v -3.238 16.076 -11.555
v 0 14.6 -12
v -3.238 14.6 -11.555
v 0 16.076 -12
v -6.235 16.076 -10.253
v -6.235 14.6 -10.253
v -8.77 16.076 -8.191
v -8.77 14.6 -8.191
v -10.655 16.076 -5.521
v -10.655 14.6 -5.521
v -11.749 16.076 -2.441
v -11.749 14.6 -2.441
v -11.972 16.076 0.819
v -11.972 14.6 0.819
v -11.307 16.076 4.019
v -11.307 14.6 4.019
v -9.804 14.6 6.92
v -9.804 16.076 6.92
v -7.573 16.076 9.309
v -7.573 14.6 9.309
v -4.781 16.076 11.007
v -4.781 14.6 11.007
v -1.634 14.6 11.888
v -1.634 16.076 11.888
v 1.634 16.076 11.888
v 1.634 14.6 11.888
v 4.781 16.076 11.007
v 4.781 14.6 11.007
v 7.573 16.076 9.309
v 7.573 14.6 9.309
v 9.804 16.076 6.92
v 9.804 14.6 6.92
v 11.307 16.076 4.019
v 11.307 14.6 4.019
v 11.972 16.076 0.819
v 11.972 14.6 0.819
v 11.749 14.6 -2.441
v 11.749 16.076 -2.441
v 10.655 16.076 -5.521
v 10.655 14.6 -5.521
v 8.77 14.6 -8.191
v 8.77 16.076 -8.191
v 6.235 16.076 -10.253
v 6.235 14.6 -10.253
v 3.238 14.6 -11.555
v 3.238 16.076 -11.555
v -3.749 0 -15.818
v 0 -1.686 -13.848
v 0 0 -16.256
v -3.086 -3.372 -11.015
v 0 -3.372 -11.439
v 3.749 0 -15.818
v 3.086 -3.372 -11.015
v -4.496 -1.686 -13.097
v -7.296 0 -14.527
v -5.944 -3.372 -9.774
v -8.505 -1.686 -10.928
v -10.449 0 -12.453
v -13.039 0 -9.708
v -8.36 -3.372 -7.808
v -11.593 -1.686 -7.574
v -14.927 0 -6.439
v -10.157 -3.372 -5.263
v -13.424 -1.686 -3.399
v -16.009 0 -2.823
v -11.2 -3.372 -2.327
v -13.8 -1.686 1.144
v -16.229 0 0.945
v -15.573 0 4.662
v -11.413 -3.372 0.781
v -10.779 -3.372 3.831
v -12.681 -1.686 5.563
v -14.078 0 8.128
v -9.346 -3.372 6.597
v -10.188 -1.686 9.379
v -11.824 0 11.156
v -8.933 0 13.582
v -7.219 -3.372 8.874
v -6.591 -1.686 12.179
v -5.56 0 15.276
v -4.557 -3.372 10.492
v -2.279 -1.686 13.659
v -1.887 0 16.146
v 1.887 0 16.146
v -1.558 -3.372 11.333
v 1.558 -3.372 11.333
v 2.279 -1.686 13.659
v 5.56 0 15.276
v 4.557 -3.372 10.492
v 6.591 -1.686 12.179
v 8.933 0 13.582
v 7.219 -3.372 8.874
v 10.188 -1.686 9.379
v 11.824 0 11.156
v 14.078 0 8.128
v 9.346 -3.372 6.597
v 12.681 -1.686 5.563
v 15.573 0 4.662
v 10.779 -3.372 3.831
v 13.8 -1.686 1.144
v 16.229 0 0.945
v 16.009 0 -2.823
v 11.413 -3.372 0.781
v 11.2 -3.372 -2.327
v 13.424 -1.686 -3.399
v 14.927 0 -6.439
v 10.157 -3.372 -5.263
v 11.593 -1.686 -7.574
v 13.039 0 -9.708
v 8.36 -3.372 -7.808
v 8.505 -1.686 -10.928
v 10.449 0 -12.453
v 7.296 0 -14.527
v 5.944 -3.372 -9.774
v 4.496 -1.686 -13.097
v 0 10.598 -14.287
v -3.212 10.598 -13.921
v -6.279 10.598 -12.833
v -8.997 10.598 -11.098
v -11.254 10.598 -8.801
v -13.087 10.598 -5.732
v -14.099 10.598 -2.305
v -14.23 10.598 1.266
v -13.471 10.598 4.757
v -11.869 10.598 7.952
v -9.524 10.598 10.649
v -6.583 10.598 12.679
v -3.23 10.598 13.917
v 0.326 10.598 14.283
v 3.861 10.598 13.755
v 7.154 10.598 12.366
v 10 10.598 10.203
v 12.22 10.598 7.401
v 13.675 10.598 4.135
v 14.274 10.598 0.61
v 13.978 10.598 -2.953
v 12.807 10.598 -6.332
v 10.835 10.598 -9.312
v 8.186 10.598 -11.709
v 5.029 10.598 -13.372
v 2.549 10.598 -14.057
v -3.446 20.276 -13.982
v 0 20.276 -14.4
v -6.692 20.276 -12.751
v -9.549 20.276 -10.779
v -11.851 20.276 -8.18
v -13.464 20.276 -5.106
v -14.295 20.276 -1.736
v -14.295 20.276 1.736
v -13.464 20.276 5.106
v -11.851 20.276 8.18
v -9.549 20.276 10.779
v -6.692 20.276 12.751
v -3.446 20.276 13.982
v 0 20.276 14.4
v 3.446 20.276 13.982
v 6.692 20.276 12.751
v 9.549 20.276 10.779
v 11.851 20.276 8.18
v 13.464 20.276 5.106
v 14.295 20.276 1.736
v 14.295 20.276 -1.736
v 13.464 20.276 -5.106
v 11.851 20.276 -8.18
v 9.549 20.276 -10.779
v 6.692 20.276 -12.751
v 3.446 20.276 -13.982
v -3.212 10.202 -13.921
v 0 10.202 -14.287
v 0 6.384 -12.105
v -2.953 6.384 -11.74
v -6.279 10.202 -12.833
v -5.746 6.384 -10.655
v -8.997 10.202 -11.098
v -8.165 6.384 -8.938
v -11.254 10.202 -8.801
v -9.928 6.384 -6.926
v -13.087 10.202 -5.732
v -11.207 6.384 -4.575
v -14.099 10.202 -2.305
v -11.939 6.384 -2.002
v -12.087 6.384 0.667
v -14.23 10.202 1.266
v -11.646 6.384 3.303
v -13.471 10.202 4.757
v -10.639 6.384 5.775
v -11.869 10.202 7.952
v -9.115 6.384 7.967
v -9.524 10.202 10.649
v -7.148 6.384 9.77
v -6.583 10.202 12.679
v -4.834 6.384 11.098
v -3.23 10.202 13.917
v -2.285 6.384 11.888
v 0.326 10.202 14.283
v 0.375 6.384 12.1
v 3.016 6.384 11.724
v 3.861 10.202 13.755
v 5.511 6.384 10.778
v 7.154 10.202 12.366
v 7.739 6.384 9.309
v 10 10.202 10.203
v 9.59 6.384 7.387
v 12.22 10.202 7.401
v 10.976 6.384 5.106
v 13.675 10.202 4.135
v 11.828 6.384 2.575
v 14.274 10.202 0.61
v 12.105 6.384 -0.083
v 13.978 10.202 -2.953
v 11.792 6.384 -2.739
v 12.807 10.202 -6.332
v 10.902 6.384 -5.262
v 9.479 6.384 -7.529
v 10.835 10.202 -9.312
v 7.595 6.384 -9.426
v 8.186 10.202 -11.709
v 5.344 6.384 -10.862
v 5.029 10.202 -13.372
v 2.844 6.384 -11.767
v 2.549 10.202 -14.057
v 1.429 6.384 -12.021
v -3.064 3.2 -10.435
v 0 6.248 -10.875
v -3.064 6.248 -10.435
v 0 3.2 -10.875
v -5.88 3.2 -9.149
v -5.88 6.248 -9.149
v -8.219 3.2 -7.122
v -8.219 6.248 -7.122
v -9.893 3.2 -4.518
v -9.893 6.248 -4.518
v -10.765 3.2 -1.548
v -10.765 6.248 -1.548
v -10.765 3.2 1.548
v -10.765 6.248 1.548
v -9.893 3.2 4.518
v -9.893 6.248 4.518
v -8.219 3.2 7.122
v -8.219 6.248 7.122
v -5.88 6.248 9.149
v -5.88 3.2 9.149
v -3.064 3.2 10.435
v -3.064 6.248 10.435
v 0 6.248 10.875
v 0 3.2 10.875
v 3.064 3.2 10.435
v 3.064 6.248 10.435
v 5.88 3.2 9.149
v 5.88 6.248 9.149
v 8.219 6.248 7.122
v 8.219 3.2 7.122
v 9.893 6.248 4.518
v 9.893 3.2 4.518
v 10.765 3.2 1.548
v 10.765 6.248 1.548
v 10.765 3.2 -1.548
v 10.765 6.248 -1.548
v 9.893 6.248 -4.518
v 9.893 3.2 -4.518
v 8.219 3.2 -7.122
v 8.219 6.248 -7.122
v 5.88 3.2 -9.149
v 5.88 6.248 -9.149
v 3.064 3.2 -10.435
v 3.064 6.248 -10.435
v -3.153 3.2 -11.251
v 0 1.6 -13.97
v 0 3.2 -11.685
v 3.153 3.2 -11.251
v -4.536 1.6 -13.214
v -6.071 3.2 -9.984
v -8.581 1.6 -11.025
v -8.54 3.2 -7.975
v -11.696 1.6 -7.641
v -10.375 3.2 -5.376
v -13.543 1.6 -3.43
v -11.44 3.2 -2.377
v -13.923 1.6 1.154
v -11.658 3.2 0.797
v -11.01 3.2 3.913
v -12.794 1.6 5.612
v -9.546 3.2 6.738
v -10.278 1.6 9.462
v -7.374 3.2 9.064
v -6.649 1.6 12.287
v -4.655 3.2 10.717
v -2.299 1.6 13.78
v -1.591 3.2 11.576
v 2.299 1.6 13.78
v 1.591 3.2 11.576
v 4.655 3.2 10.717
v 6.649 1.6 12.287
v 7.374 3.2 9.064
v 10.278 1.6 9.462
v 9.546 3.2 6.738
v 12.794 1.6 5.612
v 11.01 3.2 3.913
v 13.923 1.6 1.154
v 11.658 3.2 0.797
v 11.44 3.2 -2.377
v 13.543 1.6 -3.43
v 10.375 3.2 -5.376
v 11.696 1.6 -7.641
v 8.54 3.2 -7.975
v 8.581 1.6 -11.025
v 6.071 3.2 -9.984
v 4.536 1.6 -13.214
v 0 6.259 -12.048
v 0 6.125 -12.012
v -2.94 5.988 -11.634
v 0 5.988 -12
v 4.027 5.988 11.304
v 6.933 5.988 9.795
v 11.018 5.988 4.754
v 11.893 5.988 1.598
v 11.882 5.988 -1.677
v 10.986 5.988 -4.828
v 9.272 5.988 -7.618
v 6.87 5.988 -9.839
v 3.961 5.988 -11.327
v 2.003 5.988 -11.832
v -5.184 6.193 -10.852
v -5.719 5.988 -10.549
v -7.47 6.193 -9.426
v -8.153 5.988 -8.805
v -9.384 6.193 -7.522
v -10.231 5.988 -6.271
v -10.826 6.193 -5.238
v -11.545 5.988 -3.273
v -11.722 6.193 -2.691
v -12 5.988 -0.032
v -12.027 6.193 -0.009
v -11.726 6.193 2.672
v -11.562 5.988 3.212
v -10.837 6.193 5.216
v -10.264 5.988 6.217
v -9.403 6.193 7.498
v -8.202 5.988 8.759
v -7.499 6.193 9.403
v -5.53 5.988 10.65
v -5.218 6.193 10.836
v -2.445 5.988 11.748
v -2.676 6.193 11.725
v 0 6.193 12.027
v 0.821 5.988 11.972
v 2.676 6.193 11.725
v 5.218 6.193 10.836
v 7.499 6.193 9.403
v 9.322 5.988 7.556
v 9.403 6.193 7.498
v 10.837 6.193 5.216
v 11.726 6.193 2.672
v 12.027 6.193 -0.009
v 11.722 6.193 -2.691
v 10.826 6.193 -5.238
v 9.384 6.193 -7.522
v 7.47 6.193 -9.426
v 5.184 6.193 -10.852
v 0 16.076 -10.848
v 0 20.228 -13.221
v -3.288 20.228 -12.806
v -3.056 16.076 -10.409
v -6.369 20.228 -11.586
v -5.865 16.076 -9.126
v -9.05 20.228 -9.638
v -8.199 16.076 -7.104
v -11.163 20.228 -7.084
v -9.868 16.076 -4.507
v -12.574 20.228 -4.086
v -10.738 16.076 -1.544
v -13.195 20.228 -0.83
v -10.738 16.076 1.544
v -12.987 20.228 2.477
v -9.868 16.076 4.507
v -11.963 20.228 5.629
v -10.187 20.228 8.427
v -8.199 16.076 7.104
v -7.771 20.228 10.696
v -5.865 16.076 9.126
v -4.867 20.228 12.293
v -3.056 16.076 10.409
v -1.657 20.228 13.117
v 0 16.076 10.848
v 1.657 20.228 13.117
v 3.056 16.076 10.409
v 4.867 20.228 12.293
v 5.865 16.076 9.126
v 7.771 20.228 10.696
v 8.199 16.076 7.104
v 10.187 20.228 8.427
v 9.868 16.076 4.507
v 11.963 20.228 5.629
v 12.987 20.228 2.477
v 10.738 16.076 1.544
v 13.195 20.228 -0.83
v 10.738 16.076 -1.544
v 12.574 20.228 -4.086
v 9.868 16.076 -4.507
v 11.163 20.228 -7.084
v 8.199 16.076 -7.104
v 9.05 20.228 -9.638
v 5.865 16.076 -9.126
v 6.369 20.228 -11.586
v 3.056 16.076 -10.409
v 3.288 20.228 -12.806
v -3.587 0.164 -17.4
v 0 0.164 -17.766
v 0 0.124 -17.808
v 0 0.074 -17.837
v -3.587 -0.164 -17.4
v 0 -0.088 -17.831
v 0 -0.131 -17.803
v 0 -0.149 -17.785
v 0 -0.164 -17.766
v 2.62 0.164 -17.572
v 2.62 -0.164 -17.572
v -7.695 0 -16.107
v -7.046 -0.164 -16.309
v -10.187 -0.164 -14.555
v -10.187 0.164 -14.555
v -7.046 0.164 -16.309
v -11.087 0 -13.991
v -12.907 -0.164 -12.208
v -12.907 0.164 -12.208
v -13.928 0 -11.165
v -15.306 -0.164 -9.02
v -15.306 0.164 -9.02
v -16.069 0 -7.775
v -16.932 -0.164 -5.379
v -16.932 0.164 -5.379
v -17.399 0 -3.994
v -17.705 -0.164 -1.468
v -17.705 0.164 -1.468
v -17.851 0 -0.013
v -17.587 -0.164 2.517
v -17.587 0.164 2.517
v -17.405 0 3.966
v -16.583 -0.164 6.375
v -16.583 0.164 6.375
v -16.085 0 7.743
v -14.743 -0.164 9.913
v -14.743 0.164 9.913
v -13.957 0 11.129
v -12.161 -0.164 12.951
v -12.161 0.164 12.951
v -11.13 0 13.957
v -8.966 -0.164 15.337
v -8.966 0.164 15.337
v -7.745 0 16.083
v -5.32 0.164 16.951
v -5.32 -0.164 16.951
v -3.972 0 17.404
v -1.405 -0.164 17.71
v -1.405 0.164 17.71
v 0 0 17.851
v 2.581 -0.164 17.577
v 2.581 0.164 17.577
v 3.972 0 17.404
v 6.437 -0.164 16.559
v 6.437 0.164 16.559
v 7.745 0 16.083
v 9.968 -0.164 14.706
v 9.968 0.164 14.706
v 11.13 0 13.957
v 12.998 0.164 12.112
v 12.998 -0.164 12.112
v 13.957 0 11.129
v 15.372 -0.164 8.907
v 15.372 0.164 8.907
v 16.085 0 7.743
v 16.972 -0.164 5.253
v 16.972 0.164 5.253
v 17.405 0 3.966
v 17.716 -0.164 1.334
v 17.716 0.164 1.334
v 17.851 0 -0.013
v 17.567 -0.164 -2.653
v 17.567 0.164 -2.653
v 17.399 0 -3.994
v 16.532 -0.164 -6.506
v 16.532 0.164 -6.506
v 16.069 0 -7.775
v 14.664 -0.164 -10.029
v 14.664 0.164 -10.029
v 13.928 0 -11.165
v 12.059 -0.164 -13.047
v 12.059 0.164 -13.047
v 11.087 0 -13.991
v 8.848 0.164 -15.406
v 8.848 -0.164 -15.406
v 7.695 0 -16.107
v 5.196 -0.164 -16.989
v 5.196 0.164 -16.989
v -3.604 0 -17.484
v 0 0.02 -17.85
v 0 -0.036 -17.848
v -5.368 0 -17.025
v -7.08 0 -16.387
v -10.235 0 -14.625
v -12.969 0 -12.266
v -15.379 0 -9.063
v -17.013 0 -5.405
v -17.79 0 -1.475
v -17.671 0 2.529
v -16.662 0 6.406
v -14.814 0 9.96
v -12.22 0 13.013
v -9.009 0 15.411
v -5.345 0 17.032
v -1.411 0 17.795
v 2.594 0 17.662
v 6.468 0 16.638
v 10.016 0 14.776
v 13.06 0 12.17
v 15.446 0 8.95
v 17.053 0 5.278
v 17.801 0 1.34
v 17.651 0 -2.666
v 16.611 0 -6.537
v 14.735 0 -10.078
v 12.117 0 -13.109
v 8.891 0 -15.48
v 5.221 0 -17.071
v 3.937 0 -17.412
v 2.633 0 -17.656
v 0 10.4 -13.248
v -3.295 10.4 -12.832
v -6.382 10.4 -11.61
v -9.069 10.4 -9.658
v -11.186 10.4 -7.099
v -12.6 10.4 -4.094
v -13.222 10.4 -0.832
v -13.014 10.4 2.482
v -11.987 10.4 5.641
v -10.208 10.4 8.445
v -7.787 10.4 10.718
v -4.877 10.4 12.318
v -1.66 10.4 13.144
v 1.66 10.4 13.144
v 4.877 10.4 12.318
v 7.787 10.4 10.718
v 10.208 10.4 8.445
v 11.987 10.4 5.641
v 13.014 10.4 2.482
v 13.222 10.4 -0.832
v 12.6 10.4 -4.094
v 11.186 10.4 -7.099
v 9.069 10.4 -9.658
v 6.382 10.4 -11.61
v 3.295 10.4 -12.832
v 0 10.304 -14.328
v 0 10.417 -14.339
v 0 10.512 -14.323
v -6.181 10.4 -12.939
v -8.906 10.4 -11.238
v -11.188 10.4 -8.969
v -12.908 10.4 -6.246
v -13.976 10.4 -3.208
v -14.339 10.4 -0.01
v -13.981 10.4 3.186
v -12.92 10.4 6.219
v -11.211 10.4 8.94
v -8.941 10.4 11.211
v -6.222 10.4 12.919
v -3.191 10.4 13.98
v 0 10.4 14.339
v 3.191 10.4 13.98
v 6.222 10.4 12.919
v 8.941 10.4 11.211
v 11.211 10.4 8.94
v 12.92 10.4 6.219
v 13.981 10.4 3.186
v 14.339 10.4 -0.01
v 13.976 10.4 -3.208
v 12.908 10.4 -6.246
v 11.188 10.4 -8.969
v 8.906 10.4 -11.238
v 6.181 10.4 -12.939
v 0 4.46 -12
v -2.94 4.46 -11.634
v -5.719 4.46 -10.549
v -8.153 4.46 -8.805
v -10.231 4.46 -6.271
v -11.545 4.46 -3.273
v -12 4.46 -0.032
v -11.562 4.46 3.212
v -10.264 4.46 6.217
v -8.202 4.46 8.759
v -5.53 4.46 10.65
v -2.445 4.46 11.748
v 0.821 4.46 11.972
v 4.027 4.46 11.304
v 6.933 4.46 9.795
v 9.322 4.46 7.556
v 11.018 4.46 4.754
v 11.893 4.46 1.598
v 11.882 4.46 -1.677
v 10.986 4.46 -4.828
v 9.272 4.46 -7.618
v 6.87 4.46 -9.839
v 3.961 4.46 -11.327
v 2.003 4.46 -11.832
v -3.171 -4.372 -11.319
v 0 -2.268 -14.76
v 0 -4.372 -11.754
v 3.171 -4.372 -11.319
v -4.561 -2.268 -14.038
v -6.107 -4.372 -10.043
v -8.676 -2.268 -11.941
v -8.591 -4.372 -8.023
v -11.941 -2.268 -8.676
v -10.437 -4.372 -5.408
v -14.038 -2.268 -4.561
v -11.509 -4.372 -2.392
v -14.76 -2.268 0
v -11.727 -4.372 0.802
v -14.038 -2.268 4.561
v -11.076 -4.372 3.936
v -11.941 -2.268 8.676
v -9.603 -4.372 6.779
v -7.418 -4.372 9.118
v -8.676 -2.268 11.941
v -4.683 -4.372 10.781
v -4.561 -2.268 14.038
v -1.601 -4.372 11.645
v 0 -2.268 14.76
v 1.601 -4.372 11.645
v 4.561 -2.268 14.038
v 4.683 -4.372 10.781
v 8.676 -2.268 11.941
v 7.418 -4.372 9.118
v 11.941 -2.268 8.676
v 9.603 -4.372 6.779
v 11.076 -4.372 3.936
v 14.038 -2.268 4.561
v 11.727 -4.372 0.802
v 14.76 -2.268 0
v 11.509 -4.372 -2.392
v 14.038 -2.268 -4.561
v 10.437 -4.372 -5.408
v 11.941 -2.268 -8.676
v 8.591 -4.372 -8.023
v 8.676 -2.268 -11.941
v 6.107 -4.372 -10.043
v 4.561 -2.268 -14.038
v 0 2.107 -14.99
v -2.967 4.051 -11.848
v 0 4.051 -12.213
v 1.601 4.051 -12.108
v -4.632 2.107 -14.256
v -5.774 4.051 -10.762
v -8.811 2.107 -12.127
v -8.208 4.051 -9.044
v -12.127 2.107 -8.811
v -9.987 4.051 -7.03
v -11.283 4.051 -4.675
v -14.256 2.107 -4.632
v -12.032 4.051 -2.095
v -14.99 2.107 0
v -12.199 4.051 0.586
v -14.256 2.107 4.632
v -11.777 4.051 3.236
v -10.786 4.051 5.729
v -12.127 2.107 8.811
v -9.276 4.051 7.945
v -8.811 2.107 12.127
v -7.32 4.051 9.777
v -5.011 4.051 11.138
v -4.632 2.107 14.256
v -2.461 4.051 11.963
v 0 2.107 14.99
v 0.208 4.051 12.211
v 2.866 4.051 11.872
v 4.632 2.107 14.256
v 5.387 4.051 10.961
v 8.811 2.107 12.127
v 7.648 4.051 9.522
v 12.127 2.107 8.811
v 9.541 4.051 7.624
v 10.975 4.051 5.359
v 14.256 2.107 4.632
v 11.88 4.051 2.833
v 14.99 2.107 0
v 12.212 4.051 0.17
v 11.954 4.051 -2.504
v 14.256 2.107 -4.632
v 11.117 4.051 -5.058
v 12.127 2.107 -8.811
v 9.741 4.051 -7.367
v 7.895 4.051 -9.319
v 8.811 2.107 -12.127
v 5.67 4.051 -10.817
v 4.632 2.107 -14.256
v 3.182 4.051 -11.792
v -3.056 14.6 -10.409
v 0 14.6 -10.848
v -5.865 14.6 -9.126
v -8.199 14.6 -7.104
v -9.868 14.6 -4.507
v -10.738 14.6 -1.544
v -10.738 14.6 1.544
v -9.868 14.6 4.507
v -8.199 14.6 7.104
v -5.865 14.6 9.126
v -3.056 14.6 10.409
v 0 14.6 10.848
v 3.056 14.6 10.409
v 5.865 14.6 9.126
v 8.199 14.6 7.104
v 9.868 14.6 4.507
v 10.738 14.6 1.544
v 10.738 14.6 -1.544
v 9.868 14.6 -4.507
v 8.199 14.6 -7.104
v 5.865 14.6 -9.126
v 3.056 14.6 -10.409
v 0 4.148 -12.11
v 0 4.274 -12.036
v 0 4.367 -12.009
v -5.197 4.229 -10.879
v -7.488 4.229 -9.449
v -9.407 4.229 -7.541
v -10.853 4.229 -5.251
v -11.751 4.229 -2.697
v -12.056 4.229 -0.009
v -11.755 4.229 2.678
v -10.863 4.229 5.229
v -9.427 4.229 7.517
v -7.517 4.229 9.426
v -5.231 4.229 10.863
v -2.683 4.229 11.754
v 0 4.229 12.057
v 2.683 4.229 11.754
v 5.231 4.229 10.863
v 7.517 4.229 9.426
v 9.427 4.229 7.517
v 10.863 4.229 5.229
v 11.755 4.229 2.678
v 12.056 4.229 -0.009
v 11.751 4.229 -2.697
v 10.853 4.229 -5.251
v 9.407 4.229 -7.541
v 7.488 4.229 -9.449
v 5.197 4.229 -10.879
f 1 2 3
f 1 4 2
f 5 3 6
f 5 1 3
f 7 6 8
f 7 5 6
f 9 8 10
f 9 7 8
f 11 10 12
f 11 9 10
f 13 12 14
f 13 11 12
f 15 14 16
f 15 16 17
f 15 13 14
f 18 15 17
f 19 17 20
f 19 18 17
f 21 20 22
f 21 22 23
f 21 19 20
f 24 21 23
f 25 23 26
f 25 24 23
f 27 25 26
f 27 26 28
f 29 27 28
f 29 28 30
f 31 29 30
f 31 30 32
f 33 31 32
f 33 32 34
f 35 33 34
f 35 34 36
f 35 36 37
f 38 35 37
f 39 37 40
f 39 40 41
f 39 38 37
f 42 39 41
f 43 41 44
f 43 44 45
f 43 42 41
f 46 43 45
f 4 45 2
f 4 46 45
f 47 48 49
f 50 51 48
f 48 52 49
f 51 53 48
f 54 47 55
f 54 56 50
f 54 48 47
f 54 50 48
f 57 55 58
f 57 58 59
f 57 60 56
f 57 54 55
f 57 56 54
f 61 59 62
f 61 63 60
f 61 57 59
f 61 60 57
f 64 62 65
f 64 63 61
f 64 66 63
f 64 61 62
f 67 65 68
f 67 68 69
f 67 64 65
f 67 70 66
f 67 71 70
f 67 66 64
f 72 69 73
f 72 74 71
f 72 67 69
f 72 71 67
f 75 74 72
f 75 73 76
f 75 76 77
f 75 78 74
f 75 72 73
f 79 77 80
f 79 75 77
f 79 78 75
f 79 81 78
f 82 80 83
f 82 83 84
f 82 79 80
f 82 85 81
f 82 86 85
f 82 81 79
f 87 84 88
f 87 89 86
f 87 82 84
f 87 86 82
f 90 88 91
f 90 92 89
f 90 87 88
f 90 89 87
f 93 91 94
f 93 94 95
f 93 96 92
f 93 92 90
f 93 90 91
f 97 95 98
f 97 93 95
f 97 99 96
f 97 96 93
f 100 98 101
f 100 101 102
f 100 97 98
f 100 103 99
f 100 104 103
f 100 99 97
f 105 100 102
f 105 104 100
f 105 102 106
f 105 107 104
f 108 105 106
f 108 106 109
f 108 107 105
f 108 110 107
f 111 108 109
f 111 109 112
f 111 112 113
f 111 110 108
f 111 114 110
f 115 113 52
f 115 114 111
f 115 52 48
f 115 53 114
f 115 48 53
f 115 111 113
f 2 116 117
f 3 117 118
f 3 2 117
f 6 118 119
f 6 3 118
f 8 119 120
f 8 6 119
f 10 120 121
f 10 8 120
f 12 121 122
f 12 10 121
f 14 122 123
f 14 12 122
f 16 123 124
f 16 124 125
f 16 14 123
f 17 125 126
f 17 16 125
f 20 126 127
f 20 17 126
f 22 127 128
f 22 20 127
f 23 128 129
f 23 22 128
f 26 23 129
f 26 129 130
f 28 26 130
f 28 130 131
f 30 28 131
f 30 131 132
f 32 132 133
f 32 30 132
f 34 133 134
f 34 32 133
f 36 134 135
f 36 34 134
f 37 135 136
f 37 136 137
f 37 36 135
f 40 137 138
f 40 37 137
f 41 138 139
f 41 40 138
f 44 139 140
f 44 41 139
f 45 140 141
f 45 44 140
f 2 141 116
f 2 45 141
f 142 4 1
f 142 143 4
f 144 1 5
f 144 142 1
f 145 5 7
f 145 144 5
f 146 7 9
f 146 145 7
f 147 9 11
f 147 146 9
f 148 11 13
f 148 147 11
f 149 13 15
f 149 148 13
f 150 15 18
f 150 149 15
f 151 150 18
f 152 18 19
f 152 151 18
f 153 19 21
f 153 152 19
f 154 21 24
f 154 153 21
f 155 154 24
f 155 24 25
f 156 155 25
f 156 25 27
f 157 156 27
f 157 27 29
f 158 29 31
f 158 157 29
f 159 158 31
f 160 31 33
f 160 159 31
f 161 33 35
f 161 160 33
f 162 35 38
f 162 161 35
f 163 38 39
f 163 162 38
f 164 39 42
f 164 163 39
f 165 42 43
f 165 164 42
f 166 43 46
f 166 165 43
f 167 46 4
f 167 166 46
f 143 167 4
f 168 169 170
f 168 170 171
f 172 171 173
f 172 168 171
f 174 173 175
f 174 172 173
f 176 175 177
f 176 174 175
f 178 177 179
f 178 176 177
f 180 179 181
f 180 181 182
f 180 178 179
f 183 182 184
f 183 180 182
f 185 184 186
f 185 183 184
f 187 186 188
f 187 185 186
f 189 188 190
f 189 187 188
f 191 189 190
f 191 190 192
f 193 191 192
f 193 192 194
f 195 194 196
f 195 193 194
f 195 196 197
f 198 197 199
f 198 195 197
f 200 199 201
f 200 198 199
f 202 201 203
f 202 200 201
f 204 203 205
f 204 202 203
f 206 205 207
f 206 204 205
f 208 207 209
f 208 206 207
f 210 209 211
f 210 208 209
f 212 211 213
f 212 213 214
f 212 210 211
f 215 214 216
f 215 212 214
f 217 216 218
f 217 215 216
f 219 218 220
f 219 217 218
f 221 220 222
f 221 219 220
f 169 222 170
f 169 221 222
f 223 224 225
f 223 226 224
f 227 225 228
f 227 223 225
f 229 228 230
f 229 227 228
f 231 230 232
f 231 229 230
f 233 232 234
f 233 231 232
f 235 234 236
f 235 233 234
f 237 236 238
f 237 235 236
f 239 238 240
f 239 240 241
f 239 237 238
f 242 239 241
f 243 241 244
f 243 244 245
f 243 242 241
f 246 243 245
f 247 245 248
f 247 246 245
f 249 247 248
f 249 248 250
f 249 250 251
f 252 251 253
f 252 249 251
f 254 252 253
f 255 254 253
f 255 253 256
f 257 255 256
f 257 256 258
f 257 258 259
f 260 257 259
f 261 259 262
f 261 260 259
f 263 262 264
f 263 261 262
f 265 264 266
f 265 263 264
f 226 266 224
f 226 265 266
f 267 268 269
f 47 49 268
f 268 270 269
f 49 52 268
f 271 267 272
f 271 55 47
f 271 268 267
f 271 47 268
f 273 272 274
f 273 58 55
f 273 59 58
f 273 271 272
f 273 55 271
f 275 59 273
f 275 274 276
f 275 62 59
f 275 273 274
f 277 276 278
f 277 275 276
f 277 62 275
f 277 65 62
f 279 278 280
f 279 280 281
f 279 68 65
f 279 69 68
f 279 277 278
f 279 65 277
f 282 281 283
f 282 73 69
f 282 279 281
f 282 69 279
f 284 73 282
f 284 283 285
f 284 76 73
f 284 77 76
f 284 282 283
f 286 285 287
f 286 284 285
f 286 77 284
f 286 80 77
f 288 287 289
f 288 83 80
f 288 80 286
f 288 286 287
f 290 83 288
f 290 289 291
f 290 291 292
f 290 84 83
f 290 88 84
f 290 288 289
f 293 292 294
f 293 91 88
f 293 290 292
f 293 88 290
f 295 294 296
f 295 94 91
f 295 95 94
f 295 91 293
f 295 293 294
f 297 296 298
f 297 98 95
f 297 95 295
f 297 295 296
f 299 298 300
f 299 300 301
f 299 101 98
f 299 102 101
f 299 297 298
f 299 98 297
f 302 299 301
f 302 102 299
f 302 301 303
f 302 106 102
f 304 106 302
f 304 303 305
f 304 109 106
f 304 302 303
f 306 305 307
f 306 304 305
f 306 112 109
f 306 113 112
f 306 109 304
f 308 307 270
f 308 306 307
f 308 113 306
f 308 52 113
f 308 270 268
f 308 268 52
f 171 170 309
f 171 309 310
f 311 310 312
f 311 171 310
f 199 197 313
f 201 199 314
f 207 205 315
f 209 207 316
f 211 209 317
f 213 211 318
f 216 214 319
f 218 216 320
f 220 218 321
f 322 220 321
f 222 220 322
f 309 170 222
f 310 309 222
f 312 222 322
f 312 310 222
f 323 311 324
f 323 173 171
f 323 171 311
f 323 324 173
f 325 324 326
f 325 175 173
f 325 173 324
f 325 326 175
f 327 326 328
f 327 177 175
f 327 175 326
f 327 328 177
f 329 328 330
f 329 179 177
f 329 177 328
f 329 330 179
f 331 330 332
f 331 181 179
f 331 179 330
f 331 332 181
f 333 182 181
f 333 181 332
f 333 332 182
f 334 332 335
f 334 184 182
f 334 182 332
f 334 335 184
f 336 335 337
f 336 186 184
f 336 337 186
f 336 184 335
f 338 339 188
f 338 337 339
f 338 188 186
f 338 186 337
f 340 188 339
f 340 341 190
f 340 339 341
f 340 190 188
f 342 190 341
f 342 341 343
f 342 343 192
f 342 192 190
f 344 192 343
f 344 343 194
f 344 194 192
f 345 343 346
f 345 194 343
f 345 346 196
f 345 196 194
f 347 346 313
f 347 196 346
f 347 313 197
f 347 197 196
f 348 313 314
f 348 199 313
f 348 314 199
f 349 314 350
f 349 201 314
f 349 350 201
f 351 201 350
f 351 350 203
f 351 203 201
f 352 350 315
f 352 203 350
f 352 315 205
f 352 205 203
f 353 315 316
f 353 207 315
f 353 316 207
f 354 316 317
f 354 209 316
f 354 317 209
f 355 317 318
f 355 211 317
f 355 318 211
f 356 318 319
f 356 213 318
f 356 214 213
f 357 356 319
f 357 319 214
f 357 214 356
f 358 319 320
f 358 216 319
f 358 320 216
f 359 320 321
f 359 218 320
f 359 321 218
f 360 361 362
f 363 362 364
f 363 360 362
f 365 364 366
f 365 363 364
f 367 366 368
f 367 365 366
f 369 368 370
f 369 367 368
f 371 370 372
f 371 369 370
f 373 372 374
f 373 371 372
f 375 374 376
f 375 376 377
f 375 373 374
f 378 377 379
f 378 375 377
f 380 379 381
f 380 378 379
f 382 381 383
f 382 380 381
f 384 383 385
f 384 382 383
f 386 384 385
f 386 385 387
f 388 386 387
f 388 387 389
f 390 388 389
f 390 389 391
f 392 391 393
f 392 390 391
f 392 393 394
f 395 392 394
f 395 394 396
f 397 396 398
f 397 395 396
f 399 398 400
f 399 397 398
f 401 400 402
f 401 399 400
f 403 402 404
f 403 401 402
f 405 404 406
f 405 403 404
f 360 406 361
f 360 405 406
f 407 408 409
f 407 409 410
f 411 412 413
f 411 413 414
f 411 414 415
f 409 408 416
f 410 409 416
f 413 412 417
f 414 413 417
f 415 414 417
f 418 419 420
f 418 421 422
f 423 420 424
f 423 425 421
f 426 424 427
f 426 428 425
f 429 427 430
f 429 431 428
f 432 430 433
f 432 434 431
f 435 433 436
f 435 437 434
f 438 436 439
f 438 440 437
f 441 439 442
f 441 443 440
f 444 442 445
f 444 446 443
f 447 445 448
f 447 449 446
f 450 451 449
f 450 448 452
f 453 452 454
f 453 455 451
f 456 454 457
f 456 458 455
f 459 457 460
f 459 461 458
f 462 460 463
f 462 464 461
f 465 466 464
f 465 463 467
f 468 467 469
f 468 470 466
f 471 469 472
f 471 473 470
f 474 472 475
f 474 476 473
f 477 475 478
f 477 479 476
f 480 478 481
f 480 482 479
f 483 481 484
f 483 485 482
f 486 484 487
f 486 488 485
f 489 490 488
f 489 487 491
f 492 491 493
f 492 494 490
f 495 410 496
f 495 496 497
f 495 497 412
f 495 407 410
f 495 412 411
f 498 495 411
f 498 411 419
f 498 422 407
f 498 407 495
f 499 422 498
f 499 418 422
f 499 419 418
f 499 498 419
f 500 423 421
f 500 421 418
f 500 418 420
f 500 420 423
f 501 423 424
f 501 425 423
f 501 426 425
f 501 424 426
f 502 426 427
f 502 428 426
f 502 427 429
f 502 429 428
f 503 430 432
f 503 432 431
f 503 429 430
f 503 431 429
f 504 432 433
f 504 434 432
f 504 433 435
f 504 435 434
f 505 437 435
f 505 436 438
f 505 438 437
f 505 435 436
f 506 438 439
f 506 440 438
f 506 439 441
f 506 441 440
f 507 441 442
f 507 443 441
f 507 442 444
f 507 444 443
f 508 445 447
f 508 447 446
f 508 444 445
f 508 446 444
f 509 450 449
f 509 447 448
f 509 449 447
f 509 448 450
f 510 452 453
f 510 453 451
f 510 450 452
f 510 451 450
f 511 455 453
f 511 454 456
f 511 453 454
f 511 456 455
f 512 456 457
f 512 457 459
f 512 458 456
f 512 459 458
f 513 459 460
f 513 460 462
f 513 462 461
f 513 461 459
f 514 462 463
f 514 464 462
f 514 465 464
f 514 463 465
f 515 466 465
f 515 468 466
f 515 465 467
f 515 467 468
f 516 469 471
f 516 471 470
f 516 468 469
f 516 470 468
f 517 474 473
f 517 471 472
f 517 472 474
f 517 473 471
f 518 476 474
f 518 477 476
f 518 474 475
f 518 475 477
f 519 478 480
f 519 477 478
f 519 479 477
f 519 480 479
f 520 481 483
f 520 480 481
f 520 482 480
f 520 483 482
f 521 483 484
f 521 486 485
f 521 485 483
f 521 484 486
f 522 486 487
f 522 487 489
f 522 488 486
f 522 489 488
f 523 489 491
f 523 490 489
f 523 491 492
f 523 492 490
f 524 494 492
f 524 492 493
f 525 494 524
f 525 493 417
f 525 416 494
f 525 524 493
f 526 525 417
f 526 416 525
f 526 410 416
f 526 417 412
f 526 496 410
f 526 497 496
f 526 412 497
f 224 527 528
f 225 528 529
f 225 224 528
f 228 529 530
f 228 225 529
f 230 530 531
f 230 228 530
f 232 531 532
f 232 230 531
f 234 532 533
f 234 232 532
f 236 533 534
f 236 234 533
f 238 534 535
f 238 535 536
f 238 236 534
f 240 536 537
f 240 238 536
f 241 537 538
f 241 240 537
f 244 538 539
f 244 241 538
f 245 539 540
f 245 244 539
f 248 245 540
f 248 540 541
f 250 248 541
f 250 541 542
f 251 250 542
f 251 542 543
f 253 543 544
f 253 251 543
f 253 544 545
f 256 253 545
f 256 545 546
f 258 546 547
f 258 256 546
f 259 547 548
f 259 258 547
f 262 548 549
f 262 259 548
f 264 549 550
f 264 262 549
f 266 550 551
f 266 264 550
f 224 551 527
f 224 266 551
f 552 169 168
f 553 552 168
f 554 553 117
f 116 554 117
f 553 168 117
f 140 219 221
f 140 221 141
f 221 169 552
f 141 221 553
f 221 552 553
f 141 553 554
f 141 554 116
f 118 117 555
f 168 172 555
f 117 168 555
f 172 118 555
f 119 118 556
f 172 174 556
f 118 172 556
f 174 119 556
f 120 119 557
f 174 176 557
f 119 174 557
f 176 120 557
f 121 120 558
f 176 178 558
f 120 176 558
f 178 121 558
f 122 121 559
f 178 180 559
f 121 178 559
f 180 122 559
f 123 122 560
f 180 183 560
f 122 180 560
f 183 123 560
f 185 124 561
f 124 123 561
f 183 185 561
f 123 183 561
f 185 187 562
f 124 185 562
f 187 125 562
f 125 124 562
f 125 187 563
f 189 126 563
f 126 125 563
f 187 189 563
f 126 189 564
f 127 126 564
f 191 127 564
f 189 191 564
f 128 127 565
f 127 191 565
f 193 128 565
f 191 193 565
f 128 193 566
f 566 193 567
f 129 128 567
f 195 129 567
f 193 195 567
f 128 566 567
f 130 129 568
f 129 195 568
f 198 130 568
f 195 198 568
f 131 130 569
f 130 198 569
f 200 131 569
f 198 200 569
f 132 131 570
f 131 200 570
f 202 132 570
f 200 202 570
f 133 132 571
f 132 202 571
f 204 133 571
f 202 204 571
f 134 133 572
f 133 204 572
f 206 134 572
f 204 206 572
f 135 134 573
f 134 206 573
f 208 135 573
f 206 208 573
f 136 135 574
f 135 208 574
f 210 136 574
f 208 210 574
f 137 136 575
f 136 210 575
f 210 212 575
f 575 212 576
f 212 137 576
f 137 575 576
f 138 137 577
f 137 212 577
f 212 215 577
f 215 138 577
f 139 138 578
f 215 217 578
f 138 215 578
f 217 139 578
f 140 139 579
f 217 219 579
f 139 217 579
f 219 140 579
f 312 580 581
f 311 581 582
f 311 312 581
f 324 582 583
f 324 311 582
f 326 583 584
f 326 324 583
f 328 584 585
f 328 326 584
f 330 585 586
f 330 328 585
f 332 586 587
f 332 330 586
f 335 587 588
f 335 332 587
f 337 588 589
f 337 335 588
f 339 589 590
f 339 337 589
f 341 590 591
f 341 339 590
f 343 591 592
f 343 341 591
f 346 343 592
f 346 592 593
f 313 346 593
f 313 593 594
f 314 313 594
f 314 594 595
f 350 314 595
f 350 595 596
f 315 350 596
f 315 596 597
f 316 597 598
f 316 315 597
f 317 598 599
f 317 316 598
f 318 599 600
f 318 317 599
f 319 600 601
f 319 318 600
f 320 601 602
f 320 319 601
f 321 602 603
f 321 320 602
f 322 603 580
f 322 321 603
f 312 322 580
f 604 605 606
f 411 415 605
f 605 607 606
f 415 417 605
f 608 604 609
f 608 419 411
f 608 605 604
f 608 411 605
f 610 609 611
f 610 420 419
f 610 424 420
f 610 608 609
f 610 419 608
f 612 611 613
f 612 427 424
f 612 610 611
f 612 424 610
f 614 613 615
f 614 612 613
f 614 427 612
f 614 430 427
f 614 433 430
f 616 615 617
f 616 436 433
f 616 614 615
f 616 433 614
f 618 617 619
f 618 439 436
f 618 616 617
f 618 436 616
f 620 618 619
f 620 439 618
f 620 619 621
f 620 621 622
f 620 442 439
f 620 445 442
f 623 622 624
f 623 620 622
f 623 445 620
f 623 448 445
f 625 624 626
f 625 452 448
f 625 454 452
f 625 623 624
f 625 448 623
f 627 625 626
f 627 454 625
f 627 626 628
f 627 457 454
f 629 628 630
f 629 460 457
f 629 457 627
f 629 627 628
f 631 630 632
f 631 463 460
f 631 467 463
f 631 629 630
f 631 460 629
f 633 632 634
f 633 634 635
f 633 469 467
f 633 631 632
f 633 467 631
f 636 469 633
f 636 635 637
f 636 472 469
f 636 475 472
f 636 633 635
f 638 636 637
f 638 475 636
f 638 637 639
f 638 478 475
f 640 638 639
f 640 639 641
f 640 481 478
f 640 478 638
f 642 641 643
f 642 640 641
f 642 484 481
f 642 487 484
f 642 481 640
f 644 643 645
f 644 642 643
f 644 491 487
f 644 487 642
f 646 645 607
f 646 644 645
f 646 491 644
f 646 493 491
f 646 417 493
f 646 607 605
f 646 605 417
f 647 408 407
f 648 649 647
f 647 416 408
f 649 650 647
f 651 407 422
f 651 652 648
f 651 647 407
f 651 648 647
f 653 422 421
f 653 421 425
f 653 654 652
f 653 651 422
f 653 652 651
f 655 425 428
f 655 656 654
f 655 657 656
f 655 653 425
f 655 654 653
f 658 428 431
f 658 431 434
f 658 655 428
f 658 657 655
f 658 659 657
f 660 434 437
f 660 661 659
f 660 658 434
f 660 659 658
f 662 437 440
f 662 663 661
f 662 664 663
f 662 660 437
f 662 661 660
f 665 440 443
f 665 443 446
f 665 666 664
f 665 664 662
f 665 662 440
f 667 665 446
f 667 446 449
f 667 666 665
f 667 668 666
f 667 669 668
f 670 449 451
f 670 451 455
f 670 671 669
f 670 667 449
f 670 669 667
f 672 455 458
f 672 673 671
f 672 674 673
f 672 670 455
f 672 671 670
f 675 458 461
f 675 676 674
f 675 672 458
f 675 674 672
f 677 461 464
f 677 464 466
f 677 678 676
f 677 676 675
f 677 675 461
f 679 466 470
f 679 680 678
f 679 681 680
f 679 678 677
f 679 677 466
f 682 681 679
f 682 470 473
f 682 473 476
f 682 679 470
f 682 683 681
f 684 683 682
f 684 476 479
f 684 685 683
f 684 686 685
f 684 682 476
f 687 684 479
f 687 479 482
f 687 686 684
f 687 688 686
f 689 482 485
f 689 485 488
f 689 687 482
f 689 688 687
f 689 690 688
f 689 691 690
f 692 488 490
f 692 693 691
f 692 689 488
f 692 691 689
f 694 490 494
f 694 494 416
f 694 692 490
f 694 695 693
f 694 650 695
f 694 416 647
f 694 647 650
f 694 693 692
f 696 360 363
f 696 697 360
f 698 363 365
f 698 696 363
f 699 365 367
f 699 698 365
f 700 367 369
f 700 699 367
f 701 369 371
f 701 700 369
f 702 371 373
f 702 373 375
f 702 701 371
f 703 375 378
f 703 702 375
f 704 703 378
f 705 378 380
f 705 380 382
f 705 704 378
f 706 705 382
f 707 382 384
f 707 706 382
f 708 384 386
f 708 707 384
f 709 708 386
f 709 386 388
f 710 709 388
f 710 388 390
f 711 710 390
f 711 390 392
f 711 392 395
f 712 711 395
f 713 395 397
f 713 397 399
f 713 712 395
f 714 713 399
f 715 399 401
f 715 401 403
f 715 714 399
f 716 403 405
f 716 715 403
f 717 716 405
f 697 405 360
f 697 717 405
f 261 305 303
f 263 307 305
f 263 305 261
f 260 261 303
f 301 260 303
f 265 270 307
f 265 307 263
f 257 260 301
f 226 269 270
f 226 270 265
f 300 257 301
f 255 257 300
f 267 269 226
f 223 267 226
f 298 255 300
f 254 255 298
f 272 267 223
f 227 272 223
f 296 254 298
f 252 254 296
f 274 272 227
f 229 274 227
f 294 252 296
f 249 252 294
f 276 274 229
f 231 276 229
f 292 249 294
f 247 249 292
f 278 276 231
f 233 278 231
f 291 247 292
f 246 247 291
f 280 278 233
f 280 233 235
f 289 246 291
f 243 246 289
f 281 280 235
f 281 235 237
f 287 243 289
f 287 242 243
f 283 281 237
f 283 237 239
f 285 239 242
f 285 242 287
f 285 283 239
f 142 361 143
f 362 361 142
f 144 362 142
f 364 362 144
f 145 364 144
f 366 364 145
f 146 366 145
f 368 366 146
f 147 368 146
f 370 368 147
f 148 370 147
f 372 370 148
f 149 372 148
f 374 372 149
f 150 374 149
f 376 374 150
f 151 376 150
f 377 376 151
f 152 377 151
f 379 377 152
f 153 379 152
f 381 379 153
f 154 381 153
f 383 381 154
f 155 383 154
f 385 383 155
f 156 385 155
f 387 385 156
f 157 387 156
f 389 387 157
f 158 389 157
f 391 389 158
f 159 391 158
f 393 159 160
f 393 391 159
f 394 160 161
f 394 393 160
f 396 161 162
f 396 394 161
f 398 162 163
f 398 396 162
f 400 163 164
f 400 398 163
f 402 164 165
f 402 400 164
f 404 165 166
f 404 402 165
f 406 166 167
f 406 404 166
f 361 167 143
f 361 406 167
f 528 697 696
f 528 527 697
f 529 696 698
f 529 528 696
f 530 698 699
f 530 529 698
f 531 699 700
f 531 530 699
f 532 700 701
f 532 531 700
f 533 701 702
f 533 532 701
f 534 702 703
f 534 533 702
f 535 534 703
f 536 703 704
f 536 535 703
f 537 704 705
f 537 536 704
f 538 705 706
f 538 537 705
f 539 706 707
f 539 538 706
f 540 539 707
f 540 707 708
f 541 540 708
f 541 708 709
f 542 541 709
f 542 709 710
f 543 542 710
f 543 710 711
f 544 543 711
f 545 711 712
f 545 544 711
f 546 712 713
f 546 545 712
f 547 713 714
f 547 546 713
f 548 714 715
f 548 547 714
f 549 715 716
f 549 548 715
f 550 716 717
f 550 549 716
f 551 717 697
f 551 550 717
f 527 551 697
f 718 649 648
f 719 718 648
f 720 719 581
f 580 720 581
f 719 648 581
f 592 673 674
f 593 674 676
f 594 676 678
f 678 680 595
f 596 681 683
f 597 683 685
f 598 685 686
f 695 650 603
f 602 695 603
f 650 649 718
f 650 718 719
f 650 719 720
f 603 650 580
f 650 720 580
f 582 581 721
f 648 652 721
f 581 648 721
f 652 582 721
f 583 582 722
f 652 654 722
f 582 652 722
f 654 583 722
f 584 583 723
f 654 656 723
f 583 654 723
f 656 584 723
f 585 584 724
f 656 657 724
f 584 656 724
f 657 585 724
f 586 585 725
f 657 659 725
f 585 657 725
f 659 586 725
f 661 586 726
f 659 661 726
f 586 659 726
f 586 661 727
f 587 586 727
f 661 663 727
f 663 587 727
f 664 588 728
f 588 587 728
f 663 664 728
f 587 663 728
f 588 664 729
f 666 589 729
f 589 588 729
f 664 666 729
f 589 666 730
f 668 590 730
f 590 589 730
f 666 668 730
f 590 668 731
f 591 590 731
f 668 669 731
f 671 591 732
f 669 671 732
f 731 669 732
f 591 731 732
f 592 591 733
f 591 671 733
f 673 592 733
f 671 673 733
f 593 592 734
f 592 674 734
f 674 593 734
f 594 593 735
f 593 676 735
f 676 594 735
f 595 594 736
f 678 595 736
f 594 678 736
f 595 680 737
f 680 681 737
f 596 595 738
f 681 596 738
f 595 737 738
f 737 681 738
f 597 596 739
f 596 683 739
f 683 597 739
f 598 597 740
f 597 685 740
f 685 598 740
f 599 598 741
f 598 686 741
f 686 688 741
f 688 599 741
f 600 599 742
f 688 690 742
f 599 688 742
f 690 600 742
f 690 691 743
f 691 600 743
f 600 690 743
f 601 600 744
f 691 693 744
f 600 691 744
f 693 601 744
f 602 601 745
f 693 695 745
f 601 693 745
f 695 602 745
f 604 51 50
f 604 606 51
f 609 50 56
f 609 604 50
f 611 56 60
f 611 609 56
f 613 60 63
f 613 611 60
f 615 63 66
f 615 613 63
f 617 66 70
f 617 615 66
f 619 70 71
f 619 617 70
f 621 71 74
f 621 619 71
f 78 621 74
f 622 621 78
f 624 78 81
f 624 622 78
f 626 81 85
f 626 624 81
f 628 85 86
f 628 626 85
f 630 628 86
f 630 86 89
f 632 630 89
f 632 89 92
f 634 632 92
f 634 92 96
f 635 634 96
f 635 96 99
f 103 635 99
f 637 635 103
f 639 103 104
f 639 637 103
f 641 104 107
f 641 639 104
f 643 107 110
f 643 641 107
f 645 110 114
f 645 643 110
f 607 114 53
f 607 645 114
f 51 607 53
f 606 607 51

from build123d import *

# Parameters (mm, degrees)
FILLET_OUT_LOW_R    = 0.2
FILLET_ACTIVE_LOW_R = 0.5
FILLET5_R           = 0.4
FILLET6_R           = 0.8


with BuildPart() as part:
    # Sketch1 → Revolve1 (revolve)
    with BuildSketch(Plane.XY, mode=Mode.PRIVATE) as revolve1_sk:
        Polygon((-18, 0), (-12, 4.2), (-12, 6.2), (-14.4, 10.4), (-12, 14.6), (-12, 16.07594668), (-14.4, 20.27594668), (-13.221046964, 20.228343303), (-10.848248893, 16.07594668), (-10.848248893, 14.6), (-13.248248893, 10.4), (-10.875450822, 6.247603376), (-10.875450822, 3.2), (-11.684777769, 3.2), (-16.256206341, 0), (-11.439277272, -3.371850348), (-11.754499503, -4.371850348), align=None)
    revolve(revolve1_sk.sketch.rotate(Axis((0, -8.65, 0), (0, 1, 0)), 270), axis=Axis((0, -8.65, 0), (0, 1, 0)))

    # fillet_out_low
    fillet_out_low_edges = [part.edges().sort_by_distance(p)[0] for p in [
        (0, 0, 18),
    ]]
    fillet(fillet_out_low_edges, radius=FILLET_OUT_LOW_R)

    # Fillet_active_low
    fillet_active_low_edges = [part.edges().sort_by_distance(p)[0] for p in [
        (0, 4.2, 12),
    ]]
    fillet(fillet_active_low_edges, radius=FILLET_ACTIVE_LOW_R)

    # Fillet5
    fillet5_edges = [part.edges().sort_by_distance(p)[0] for p in [
        (0, 10.4, 14.4),
    ]]
    fillet(fillet5_edges, radius=FILLET5_R)

    # Fillet6
    fillet6_edges = [part.edges().sort_by_distance(p)[0] for p in [
        (0, 6.2, 12),
    ]]
    fillet(fillet6_edges, radius=FILLET6_R)


solid = part.part
